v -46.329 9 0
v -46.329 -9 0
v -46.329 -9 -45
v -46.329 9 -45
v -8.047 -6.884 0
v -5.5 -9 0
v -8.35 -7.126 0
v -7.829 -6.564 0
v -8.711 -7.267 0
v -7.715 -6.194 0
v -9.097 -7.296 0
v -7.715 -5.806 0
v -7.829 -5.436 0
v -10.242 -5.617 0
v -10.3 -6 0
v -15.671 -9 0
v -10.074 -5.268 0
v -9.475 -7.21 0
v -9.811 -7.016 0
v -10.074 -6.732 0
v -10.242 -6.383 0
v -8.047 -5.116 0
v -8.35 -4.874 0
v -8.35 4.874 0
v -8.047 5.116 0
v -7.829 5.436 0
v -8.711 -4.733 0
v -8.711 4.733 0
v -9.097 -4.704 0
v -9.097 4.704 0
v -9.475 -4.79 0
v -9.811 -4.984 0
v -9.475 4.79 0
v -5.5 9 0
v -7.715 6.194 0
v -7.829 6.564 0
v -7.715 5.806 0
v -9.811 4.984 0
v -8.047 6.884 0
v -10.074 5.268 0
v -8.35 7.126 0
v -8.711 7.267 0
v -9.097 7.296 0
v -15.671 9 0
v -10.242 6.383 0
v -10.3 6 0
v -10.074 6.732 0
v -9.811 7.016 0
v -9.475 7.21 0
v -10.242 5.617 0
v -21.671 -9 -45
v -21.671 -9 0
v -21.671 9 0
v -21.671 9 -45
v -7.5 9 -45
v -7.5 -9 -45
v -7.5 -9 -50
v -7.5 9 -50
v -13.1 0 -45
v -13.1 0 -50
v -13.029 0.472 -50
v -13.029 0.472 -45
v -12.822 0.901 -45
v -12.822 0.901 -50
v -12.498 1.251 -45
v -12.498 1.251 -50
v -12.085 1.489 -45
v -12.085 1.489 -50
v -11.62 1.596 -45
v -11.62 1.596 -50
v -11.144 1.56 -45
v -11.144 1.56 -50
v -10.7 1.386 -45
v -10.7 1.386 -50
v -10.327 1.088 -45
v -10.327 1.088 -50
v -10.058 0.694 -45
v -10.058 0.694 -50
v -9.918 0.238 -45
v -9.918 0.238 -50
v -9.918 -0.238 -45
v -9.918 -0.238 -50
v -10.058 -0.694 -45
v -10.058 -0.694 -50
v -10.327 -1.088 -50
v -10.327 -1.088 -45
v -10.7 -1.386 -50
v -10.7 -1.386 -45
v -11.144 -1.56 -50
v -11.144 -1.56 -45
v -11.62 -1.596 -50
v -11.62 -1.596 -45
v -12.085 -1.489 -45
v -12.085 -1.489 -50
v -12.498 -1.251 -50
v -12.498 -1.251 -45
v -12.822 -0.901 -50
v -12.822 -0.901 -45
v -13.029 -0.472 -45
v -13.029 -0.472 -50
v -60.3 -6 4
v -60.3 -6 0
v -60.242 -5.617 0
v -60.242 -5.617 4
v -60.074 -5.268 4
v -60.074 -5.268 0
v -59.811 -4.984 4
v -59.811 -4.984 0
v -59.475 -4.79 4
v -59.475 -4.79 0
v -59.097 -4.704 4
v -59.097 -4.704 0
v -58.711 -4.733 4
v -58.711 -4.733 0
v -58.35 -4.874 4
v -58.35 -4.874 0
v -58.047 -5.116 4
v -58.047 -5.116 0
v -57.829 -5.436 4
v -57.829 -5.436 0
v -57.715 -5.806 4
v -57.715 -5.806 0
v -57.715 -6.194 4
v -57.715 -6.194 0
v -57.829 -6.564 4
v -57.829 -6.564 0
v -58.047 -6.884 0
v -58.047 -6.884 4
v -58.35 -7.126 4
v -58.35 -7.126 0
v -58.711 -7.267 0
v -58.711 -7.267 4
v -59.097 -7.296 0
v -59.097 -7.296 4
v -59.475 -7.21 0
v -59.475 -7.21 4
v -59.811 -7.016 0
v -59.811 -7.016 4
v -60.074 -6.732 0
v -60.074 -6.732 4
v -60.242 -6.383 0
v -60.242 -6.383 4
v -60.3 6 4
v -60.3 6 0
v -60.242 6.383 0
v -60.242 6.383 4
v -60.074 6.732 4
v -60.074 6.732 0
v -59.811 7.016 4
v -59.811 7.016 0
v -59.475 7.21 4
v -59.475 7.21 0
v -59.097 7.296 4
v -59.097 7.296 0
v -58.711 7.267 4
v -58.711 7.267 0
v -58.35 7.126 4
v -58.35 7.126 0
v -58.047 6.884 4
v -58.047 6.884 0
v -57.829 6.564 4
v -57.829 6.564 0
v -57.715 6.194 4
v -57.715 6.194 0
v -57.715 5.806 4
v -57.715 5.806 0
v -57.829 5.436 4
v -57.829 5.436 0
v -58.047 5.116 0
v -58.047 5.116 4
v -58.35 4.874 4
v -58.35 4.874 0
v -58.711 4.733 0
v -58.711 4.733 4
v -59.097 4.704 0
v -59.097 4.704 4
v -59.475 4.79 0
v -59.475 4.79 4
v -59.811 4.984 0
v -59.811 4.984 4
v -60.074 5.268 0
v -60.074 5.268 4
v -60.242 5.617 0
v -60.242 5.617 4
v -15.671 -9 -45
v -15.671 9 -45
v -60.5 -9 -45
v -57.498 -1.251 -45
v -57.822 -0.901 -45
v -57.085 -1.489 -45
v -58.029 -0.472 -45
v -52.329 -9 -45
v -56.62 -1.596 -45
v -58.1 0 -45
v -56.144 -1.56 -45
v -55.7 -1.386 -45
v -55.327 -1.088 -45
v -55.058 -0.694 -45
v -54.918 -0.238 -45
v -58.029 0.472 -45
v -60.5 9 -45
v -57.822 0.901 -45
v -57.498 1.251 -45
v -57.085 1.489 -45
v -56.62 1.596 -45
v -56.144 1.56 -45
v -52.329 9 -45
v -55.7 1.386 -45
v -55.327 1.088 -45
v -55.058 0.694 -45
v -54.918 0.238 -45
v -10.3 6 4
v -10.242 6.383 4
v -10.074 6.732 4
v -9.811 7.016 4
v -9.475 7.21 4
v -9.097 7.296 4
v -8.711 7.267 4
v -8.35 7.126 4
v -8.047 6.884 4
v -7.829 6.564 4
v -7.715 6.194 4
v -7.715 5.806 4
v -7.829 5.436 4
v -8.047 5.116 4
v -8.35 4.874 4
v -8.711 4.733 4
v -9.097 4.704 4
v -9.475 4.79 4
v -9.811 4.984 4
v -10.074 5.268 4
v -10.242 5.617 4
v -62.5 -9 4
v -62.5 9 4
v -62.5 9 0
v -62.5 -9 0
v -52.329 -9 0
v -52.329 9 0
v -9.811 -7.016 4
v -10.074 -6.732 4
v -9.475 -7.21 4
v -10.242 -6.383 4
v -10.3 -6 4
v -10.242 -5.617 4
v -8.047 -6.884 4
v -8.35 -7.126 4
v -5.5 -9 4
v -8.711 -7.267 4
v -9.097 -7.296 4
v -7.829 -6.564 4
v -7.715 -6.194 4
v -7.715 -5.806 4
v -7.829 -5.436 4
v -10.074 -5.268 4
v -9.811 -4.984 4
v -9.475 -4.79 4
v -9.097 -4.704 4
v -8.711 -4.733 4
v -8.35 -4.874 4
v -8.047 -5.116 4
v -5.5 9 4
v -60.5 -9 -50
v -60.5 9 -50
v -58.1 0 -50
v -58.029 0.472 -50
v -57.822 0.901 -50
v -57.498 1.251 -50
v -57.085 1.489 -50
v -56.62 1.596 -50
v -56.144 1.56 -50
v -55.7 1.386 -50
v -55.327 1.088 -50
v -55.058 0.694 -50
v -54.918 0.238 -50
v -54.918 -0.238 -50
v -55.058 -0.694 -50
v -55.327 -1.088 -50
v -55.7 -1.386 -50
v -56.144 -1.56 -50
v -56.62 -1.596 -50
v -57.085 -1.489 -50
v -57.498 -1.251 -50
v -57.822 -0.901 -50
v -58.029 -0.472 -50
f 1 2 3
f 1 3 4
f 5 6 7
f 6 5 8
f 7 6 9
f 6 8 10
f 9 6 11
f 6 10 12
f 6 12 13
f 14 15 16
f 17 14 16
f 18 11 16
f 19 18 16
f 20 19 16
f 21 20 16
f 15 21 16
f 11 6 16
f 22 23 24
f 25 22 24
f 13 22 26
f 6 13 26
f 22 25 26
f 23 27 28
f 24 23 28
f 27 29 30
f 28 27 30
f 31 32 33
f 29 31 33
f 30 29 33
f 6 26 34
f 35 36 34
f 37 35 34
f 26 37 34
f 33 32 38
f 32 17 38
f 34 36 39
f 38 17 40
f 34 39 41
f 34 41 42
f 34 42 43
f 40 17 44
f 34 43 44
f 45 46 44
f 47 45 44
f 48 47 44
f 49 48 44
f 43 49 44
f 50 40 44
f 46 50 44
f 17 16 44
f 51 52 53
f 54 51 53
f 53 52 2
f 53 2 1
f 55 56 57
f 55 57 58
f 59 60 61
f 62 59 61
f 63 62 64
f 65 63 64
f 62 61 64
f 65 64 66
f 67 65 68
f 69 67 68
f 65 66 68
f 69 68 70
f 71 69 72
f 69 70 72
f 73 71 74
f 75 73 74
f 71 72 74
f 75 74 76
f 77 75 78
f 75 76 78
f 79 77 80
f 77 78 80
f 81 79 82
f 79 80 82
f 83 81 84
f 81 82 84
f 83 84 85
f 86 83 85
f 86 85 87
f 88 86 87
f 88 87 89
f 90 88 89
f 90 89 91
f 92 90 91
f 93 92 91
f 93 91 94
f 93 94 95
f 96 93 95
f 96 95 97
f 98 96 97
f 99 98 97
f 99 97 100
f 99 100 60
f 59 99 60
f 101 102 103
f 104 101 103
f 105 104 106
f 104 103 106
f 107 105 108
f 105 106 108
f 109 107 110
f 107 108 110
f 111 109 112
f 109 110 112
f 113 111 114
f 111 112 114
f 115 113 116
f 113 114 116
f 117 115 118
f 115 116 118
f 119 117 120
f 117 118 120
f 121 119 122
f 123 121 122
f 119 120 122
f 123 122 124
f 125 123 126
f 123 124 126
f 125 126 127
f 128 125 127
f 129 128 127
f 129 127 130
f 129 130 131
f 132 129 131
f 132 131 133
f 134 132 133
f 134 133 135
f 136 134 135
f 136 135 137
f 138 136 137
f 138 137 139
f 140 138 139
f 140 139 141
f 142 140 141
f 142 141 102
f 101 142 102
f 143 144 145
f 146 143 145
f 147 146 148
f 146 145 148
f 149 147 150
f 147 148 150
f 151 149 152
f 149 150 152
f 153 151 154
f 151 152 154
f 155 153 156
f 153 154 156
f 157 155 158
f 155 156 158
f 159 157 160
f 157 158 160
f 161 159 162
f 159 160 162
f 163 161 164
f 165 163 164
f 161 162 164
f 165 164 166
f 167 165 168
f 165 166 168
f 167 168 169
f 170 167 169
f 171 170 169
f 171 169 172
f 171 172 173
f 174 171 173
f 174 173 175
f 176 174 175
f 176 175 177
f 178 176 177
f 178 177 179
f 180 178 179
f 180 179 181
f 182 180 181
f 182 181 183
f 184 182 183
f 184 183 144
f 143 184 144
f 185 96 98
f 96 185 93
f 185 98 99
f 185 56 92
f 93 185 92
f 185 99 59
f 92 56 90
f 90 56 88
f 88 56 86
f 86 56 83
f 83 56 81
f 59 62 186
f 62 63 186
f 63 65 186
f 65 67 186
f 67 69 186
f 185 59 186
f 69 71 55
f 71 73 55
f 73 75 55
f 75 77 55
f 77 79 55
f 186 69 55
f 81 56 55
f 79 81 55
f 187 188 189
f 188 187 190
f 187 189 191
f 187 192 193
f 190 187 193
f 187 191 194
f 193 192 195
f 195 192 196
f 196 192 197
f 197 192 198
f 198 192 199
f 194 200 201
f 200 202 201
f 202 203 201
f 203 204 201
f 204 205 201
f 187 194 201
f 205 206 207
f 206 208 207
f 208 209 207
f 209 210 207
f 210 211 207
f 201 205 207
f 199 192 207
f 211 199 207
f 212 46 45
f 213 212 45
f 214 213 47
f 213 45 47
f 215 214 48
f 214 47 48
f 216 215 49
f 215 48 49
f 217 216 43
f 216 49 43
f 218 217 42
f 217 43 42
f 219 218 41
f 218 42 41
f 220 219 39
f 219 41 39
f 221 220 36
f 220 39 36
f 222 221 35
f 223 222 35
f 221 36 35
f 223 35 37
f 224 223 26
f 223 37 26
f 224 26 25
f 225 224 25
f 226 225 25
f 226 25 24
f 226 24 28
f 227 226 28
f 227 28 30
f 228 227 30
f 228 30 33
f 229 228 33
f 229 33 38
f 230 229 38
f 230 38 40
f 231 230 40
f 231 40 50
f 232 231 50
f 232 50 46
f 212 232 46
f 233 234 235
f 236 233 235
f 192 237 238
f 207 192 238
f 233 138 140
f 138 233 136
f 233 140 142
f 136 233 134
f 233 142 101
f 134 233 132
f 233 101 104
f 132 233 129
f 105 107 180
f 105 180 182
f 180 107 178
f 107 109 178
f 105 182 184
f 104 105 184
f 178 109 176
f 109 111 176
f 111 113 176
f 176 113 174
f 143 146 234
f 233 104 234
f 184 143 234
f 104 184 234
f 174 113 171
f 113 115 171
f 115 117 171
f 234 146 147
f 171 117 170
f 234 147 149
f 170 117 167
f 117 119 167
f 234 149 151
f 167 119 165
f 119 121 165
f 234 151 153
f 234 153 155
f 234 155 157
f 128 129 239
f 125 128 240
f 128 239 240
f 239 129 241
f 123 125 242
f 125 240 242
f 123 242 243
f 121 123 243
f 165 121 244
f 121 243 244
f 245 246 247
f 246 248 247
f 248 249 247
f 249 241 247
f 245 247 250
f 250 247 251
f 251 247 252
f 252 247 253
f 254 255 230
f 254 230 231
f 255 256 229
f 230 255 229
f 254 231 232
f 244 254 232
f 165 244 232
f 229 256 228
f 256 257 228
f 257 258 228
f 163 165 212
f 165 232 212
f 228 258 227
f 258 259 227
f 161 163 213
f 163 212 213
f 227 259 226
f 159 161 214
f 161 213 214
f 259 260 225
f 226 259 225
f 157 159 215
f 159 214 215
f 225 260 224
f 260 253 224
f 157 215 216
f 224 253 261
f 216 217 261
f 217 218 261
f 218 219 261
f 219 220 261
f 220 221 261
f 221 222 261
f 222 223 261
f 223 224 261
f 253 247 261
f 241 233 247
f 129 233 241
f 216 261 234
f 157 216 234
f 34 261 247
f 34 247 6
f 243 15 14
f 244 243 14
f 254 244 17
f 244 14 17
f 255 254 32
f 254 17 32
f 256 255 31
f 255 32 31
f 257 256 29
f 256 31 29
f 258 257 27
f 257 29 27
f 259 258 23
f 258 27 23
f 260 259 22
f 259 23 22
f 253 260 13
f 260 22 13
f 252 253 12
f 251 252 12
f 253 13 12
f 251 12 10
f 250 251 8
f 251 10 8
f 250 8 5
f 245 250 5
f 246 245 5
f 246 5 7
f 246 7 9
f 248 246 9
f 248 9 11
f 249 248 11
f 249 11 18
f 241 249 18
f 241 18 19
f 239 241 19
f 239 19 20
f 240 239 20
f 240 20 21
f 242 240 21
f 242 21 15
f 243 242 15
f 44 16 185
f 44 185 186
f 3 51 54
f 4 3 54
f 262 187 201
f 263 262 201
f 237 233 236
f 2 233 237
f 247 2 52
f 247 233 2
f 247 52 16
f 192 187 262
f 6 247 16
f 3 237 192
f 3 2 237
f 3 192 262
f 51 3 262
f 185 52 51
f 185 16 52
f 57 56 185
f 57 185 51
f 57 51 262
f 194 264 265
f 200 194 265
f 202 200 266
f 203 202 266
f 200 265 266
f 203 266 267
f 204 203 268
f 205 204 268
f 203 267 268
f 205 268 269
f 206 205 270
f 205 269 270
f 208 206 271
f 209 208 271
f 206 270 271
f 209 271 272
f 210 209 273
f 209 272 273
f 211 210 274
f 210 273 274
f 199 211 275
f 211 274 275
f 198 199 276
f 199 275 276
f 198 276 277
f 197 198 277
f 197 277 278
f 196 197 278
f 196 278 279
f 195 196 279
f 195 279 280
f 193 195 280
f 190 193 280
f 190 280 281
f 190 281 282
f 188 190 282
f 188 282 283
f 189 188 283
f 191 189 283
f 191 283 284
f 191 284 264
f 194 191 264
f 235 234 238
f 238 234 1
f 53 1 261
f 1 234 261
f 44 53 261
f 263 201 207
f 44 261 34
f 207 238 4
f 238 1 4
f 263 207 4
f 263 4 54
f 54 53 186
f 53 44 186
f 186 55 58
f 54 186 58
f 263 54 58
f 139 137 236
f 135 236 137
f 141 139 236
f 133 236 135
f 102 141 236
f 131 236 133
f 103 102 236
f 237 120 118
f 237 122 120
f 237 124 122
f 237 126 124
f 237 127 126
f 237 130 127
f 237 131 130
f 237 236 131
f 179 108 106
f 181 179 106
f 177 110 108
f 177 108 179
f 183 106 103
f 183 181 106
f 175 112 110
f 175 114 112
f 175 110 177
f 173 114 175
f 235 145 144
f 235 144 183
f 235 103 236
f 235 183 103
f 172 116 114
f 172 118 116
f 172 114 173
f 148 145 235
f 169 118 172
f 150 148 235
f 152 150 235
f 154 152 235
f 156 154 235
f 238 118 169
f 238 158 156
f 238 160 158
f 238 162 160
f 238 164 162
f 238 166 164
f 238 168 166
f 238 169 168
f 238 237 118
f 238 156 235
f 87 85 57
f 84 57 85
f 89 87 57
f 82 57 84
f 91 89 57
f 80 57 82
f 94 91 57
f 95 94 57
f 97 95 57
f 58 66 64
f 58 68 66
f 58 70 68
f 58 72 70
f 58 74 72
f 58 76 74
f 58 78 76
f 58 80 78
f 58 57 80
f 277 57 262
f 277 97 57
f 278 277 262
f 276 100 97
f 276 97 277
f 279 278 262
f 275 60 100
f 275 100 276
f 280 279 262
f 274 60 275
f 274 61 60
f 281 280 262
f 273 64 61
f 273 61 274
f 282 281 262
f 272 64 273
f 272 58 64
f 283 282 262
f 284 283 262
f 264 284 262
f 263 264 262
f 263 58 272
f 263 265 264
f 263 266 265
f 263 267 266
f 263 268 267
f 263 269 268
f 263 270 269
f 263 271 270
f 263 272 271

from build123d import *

# Parameters (mm, degrees)
SKETCH_1_W           = 5
SKETCH_1_H           = 18
SKETCH_1_R           = 1.3
EXTRUDE_1_DEPTH      = 4
SKETCH_2_W           = 5
SKETCH_2_H           = 18
EXTRUDE_2_DEPTH      = 54
SKETCH_3_W           = 5
SKETCH_3_H           = 18
EXTRUDE_3_DEPTH      = 53
SKETCH_4_R           = 1.6
CUT_EXTRUDE_1_DEPTH  = 50
SKETCH_8_W           = 4
SKETCH_8_H           = 18
EXTRUDE_4_DEPTH      = 53
SKETCH_9_R           = 1.3
CUT_EXTRUDE_6_DEPTH  = 12
SKETCH_14_W          = 4
SKETCH_14_H          = 18
CUT_EXTRUDE_8_DEPTH  = 5
SKETCH_15_W          = 4
SKETCH_15_H          = 18
CUT_EXTRUDE_9_DEPTH  = 5
SKETCH_16_W          = 6
SKETCH_16_H          = 18
EXTRUDE_5_DEPTH      = 45
SKETCH_17_W          = 5
SKETCH_17_H          = 18
CUT_EXTRUDE_10_DEPTH = 77
SKETCH_19_W          = 4
SKETCH_19_H          = 18
EXTRUDE_6_DEPTH      = 2


with BuildPart() as part:
    # 草图1 → 凸台-拉伸1 (new body)
    with BuildSketch(Plane.XY):
        Rectangle(SKETCH_1_W, SKETCH_1_H)
        with Locations((0, -6)):
            Circle(SKETCH_1_R, mode=Mode.SUBTRACT)
        with Locations(Location((0, 6, 0), (0, 0, 180))):
            Circle(SKETCH_1_R, mode=Mode.SUBTRACT)
    extrude_1 = extrude(amount=EXTRUDE_1_DEPTH)

    # 草图2 → 凸台-拉伸2 (add)
    with BuildSketch(Plane.XY.offset(4)):
        with Locations((-5, 0)):
            Rectangle(SKETCH_2_W, SKETCH_2_H)
    extrude_2 = extrude(amount=-EXTRUDE_2_DEPTH)

    # 草图3 → 凸台-拉伸3 (add)
    with BuildSketch(Plane.ZY.offset(7.5)):
        with Locations((-47.5, 0)):
            Rectangle(SKETCH_3_W, SKETCH_3_H)
    extrude(amount=EXTRUDE_3_DEPTH)

    # 镜向1: 凸台-拉伸2 across plane
    add(extrude_2.mirror(Plane.ZY.offset(34)))

    # 镜向2: 凸台-拉伸1 across plane
    add(extrude_1.mirror(Plane.ZY.offset(34)))

    # 草图4 → 切除-拉伸1 (cut)
    with BuildSketch(Plane(origin=(0, 0, -50), x_dir=(-1, 0, 0), z_dir=(0, 0, -1))):
        with Locations((11.5, 0)):
            Circle(SKETCH_4_R)
        with Locations((56.5, 0)):
            Circle(SKETCH_4_R)
    extrude(amount=-CUT_EXTRUDE_1_DEPTH, mode=Mode.SUBTRACT)

    # 草图8 → 凸台-拉伸4 (add)
    with BuildSketch(Plane.ZY.offset(7.5)):
        with Locations((2, 0)):
            Rectangle(SKETCH_8_W, SKETCH_8_H)
    extrude(amount=EXTRUDE_4_DEPTH)

    # 草图9 → 切除-拉伸6 (cut)
    with BuildSketch(Plane(origin=(0, 0, 0), x_dir=(-1, 0, 0), z_dir=(0, 0, -1))):
        with Locations((59, 6)):
            Circle(SKETCH_9_R)
        with Locations((59, -6)):
            Circle(SKETCH_9_R)
        with Locations((9, -6)):
            Circle(SKETCH_9_R)
        with Locations((9, 6)):
            Circle(SKETCH_9_R)
    extrude(amount=-CUT_EXTRUDE_6_DEPTH, mode=Mode.SUBTRACT)

    # 草图14 → 切除-拉伸8 (cut)
    with BuildSketch(Plane(origin=(2.5, 0, 0), x_dir=(0, 0, -1), z_dir=(1, 0, 0))):
        with Locations((-2, 0)):
            Rectangle(SKETCH_14_W, SKETCH_14_H)
    extrude(amount=-CUT_EXTRUDE_8_DEPTH, mode=Mode.SUBTRACT)

    # 草图15 → 切除-拉伸9 (cut)
    with BuildSketch(Plane.ZY.offset(70.5)):
        with Locations((2, 0)):
            Rectangle(SKETCH_15_W, SKETCH_15_H)
    extrude(amount=-CUT_EXTRUDE_9_DEPTH, mode=Mode.SUBTRACT)

    # 草图16 → 凸台-拉伸5 (add)
    with BuildSketch(Plane(origin=(0, 0, 0), x_dir=(-1, 0, 0), z_dir=(0, 0, -1))):
        with Locations((18.670705093, 0)):
            Rectangle(SKETCH_16_W, SKETCH_16_H)
        with Locations((49.329294907, 0)):
            Rectangle(SKETCH_16_W, SKETCH_16_H)
    extrude_5 = extrude(amount=EXTRUDE_5_DEPTH)

    # 草图17 → 切除-拉伸10 (cut)
    with BuildSketch(Plane.XY.offset(4)):
        with Locations((-5, 0)):
            Rectangle(SKETCH_17_W, SKETCH_17_H)
    cut_extrude_10 = extrude(amount=-CUT_EXTRUDE_10_DEPTH, mode=Mode.SUBTRACT)

    # 草图19 → 凸台-拉伸6 (add)
    with BuildSketch(Plane(origin=(-7.5, 0, 0), x_dir=(0, 0, -1), z_dir=(1, 0, 0))):
        with Locations((-2, 0)):
            Rectangle(SKETCH_19_W, SKETCH_19_H)
    extrude_6 = extrude(amount=EXTRUDE_6_DEPTH)

    # 镜向3: 凸台-拉伸5, 切除-拉伸10, 凸台-拉伸6 across plane
    add(extrude_5.mirror(Plane.ZY.offset(34)))
    add(cut_extrude_10.mirror(Plane.ZY.offset(34)), mode=Mode.SUBTRACT)
    add(extrude_6.mirror(Plane.ZY.offset(34)))


solid = part.part
